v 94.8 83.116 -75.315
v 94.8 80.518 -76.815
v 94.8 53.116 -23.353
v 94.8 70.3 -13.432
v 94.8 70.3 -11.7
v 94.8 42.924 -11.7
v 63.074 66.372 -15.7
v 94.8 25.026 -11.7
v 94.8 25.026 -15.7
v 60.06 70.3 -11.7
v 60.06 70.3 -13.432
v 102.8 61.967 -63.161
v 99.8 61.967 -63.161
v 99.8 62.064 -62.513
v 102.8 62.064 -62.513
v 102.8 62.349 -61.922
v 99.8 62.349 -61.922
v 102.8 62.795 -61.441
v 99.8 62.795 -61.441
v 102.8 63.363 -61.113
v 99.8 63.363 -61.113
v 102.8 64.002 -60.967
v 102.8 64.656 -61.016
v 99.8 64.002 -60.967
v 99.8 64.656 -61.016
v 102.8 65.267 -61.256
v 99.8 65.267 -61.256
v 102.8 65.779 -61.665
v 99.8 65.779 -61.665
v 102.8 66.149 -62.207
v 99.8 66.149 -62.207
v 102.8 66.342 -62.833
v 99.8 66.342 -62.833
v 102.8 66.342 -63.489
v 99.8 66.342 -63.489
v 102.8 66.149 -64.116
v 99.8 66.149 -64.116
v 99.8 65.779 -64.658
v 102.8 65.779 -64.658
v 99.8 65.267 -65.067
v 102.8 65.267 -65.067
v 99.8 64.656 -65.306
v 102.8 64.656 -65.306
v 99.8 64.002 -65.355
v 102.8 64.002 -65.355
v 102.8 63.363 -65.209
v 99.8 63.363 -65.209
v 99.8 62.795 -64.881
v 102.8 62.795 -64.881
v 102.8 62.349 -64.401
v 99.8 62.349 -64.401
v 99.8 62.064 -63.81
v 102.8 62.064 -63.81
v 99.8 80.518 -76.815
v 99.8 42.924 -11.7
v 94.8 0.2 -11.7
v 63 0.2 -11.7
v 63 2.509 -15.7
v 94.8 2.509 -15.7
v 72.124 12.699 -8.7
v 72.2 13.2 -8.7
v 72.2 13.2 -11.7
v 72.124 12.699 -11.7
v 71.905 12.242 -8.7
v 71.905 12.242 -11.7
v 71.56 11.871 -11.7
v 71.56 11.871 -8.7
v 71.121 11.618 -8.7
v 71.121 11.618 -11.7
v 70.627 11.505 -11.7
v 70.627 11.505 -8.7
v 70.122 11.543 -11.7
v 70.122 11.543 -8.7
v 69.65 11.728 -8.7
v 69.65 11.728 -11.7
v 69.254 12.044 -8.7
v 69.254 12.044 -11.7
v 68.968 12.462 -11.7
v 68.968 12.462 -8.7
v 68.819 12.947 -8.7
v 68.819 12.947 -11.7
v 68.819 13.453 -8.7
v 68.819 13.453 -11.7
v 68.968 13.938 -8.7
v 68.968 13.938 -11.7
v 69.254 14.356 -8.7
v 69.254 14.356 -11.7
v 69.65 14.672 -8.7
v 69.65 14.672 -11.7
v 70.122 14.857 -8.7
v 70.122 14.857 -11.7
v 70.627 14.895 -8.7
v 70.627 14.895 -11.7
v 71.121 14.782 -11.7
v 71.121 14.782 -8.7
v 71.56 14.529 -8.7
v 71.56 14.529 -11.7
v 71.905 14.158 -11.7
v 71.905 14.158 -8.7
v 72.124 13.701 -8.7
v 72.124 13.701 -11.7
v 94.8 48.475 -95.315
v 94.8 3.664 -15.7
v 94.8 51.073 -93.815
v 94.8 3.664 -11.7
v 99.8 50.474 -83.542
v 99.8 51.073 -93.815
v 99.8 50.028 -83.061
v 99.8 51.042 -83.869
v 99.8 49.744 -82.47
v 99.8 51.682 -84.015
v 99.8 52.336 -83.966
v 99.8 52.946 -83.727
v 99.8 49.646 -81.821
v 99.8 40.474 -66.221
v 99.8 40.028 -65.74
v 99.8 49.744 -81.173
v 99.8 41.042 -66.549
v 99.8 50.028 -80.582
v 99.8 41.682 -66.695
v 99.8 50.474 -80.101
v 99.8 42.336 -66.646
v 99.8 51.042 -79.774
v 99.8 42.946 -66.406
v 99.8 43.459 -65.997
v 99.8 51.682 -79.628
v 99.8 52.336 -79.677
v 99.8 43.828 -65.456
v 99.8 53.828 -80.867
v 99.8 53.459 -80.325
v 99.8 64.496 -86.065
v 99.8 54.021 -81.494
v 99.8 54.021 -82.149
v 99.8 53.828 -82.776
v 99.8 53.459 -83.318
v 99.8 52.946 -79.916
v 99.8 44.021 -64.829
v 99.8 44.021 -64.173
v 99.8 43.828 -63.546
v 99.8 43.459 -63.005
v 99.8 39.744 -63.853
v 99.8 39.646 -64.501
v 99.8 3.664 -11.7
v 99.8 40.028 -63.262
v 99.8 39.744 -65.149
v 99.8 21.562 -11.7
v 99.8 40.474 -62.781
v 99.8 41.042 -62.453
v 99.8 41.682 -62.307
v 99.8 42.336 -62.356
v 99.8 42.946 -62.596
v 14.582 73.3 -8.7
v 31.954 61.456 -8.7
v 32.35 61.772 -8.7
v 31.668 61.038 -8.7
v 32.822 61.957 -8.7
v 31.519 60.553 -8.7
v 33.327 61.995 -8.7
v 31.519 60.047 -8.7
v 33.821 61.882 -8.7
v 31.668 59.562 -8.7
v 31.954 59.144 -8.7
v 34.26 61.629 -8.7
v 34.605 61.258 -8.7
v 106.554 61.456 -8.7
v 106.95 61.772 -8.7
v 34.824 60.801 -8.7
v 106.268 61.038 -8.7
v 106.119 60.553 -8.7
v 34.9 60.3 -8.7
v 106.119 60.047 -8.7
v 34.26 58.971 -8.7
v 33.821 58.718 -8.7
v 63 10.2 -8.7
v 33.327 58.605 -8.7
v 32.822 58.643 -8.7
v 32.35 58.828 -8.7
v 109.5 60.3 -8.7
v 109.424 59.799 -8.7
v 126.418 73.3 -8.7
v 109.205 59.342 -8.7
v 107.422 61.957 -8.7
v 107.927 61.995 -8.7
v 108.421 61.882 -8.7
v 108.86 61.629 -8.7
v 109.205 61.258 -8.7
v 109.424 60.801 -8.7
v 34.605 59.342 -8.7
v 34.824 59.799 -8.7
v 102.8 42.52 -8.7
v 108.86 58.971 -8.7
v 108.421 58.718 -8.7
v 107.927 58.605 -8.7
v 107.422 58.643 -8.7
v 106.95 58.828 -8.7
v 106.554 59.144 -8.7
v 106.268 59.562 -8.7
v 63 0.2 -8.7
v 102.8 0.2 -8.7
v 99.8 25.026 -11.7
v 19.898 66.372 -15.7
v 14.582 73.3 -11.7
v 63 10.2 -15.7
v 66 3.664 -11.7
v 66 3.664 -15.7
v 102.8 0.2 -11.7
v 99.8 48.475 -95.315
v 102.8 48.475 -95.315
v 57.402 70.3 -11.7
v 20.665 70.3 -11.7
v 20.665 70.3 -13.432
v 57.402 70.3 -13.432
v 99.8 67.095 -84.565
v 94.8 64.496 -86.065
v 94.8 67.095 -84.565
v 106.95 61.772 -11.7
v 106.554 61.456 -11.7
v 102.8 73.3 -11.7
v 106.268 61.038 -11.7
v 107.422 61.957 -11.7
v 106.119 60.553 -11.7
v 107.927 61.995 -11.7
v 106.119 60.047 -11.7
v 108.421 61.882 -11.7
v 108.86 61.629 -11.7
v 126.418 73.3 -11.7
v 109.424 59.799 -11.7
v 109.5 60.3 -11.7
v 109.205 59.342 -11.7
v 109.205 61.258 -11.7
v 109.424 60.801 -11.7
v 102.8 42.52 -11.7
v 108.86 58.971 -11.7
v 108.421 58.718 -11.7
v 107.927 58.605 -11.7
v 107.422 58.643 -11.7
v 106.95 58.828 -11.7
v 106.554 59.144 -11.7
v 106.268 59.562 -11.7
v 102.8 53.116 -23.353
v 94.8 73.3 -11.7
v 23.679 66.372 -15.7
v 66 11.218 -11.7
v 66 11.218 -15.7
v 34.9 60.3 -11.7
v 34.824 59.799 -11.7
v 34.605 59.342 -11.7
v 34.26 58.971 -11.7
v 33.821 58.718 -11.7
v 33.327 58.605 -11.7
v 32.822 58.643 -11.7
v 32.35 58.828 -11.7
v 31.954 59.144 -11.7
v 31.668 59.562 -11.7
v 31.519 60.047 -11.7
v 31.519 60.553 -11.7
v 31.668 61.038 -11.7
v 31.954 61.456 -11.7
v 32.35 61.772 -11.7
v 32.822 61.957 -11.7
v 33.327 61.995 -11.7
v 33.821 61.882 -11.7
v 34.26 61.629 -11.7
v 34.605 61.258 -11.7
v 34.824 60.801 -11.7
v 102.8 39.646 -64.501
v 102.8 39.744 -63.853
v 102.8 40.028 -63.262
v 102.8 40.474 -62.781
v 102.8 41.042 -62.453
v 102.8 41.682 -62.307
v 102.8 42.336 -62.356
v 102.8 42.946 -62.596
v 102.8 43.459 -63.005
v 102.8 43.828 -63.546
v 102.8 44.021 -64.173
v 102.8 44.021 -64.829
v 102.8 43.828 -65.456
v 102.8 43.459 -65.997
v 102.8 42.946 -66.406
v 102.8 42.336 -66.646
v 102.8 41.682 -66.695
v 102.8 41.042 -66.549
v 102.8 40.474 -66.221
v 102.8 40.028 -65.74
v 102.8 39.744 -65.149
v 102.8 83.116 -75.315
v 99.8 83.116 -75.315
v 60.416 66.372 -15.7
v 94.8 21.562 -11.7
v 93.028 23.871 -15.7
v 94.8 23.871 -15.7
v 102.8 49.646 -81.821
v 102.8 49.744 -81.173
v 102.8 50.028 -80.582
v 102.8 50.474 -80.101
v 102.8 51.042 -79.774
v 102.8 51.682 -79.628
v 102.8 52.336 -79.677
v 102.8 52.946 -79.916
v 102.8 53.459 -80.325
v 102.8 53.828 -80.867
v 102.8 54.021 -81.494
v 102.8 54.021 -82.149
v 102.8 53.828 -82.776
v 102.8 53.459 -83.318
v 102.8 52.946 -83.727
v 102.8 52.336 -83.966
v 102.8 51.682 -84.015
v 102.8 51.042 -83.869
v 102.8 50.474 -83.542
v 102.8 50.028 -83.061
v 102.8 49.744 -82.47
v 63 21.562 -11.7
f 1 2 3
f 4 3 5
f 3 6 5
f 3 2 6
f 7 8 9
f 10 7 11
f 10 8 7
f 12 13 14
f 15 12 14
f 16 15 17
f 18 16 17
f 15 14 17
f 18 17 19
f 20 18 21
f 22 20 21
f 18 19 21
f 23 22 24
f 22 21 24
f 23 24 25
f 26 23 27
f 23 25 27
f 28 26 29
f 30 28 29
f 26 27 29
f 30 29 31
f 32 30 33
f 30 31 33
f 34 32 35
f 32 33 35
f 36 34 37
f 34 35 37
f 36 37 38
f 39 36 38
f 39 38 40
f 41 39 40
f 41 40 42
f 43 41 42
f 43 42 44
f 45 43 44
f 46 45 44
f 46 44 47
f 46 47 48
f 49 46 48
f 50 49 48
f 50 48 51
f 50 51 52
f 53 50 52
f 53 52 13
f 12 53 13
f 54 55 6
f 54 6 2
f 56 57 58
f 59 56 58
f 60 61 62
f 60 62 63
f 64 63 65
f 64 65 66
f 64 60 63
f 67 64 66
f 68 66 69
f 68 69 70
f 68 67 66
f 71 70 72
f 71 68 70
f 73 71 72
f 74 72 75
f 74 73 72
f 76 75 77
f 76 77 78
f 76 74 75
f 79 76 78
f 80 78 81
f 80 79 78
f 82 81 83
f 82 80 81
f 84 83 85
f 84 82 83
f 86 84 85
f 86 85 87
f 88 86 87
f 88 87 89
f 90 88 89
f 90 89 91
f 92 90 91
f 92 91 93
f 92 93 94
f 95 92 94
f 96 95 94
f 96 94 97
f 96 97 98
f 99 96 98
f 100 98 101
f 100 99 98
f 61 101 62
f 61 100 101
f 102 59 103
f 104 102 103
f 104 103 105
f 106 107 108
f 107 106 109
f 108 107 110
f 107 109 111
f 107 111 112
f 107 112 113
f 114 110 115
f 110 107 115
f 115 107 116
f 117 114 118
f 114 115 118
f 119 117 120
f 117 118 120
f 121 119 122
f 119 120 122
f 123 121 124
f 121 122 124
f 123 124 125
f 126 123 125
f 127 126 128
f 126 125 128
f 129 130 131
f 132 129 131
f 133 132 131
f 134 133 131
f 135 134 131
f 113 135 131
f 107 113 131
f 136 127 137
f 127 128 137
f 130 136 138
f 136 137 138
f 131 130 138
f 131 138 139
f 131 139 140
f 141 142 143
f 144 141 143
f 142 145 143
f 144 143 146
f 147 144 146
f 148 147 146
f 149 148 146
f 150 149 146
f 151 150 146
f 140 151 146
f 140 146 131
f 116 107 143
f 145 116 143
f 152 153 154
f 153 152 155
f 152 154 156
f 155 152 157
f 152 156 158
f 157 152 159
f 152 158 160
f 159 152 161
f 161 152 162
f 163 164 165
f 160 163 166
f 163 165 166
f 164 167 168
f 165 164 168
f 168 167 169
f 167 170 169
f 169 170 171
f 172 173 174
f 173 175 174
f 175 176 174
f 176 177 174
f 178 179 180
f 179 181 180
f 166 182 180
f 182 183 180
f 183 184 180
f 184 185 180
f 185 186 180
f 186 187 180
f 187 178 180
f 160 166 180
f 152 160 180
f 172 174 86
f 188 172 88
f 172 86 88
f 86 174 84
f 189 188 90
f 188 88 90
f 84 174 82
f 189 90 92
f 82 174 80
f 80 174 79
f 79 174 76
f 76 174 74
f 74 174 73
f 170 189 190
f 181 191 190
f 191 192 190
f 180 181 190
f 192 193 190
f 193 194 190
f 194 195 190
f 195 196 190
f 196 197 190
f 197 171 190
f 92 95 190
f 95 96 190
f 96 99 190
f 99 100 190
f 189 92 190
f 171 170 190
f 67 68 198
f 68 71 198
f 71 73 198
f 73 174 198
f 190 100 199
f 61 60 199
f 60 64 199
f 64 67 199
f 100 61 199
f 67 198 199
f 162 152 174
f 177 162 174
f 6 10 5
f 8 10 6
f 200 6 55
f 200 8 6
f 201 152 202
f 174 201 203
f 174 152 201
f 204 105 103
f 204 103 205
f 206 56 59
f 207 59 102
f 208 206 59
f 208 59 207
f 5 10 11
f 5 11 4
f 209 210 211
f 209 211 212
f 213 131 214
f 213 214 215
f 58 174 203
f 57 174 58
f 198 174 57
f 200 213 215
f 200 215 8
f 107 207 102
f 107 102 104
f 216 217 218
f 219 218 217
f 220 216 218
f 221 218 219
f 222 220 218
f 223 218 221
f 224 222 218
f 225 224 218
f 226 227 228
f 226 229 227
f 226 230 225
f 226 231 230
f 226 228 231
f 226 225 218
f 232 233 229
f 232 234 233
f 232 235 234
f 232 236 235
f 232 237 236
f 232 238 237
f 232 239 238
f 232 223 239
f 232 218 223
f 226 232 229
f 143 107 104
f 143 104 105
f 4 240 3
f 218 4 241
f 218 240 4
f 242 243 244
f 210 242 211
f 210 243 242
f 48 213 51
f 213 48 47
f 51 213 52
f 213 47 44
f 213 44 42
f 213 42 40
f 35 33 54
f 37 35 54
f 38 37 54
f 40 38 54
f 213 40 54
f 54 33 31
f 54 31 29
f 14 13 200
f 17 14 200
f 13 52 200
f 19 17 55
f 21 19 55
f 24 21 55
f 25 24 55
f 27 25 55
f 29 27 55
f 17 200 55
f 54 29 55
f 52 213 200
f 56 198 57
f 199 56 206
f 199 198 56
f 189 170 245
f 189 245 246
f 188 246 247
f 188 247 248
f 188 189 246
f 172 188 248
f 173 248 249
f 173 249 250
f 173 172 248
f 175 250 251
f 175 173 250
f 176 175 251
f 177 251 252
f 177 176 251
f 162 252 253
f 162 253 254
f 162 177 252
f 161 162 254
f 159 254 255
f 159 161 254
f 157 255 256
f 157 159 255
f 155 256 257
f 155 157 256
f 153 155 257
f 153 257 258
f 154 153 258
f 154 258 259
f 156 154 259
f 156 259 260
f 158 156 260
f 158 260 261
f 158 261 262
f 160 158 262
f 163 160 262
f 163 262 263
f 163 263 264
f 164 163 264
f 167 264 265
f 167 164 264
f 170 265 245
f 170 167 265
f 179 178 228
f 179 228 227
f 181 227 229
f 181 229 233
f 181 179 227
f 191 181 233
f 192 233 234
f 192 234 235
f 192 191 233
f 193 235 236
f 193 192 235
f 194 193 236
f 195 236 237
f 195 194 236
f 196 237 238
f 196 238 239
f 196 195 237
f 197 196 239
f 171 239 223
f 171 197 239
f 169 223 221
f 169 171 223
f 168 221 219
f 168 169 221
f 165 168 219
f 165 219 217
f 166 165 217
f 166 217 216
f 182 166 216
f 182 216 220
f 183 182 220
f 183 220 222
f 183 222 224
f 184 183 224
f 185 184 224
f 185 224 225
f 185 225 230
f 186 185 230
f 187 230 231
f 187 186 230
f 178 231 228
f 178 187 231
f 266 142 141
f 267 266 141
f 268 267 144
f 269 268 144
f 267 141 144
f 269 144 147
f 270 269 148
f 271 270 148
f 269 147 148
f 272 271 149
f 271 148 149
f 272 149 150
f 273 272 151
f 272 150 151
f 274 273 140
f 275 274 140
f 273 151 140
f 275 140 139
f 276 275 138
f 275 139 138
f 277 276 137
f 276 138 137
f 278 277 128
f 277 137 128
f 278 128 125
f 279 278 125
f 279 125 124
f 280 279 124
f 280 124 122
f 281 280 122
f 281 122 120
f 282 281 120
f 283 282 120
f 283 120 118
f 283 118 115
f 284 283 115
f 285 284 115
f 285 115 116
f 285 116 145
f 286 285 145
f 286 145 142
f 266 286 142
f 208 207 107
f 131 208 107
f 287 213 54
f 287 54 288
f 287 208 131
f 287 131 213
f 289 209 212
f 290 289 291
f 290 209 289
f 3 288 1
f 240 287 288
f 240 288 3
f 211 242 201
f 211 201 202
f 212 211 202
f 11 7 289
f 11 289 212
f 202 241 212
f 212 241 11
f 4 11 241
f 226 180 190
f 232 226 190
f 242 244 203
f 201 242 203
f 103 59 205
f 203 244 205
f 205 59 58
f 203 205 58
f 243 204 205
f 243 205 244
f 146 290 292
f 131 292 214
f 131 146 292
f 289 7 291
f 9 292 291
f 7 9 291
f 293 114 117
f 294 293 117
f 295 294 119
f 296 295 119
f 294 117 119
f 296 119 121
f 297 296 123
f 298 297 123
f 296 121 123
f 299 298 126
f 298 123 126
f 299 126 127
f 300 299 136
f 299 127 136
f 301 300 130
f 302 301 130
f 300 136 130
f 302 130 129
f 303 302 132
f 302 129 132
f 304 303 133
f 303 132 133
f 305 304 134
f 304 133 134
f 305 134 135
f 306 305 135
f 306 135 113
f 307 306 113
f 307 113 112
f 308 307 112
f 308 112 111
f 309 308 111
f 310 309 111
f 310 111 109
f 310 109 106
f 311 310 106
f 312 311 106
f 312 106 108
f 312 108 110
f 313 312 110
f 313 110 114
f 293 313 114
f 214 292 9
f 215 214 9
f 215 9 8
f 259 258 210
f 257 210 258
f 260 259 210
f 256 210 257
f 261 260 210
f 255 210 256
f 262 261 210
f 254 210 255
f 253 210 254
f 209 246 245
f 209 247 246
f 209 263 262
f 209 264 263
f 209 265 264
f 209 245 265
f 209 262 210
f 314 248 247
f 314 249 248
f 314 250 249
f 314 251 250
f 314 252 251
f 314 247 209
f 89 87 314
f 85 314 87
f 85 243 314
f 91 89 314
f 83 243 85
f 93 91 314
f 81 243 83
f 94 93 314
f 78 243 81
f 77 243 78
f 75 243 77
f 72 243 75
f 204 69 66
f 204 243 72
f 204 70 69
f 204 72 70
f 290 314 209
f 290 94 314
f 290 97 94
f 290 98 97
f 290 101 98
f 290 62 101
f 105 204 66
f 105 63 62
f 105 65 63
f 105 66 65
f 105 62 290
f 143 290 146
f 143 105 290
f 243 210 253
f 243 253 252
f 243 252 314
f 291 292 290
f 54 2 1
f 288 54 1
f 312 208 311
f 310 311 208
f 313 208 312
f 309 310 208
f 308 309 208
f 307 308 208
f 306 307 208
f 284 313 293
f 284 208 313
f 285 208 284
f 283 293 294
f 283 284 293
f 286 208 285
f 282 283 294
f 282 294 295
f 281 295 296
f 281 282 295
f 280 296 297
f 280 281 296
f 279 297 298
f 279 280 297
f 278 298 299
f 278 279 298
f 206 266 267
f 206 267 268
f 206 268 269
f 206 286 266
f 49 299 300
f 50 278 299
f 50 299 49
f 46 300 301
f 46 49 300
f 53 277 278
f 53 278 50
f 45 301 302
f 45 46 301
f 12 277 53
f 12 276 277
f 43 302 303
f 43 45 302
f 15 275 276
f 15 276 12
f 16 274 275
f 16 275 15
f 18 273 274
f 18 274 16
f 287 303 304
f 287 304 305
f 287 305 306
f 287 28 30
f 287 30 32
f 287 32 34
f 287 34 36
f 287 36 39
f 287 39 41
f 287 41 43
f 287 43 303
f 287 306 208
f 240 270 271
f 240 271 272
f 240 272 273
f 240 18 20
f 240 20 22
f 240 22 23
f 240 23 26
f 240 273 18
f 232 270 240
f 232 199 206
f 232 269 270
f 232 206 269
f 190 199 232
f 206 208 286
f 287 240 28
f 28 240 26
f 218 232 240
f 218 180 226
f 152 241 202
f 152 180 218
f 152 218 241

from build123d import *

# Parameters (mm, degrees)
SKETCH040_R     = 1.7
PAD021_DEPTH    = 3
PAD022_DEPTH    = 3
SKETCH041_R     = 2.2
POCKET013_DEPTH = 26.619333
PAD020_DEPTH    = 5
PAD023_DEPTH    = 4
POCKET015_DEPTH = 31.8
POCKET014_DEPTH = 80.219333


with BuildPart() as part:
    # Sketch040 (on Face4 of Binder004) → Pad021 (new body)
    with BuildSketch(Plane(origin=(0, 0, -8.7), x_dir=(1, 0, 0), z_dir=(0, 0, -1))):
        Polygon((63, -0.2), (63, -10.2), (14.581667, -73.3), (126.418333, -73.3), (102.8, -42.519989), (102.8, -0.2), align=None)
        with Locations((70.5, -13.2)):
            Circle(SKETCH040_R, mode=Mode.SUBTRACT)
        with Locations((107.8, -60.3)):
            Circle(SKETCH040_R, mode=Mode.SUBTRACT)
        with Locations((33.2, -60.3)):
            Circle(SKETCH040_R, mode=Mode.SUBTRACT)
    extrude(amount=PAD021_DEPTH)

    # Sketch042 (on Face6 of Pad021) → Pad022 (join)
    with BuildSketch(Plane.YZ.offset(102.8)):
        Polygon((0.2, -11.7), (48.475, -95.314753), (83.116016, -75.314753), (53.116016, -23.353229), (73.3, -11.7), align=None)
    extrude(amount=-PAD022_DEPTH)

    # Sketch041 (on Face14 of Pad022) → Pocket013 (cut, through all)
    with BuildSketch(Plane(origin=(99.8, 0, 0), x_dir=(0, -1, 0), z_dir=(-1, 0, 0))):
        with Locations((-51.846002, -81.821499)):
            Circle(SKETCH041_R)
        with Locations((-41.846002, -64.500991)):
            Circle(SKETCH041_R)
        with Locations((-64.16651, -63.161245)):
            Circle(SKETCH041_R)
    extrude(amount=-POCKET013_DEPTH, mode=Mode.SUBTRACT)

    # Sketch043 (on Face14 of Pocket013) → Pad020 (join)
    with BuildSketch(Plane(origin=(99.8, 0, 0), x_dir=(0, -1, 0), z_dir=(-1, 0, 0))):
        Polygon((-0.2, -11.7), (-48.475, -95.314753), (-51.073076, -93.814753), (-3.664102, -11.7), align=None)
        Polygon((-42.92392, -11.7), (-80.51794, -76.814753), (-83.116016, -75.314753), (-53.116016, -23.353229), (-73.3, -11.7), align=None)
        Polygon((-21.56196, -11.7), (-64.49647, -86.064753), (-67.094546, -84.564753), (-25.026062, -11.7), align=None)
    extrude(amount=PAD020_DEPTH)

    # Sketch038 (on Face5 of Pad020) → Pad023 (join)
    with BuildSketch(Plane(origin=(0, 0, -11.7), x_dir=(1, 0, 0), z_dir=(0, 0, -1))):
        Polygon((94.8, -3.664102), (66, -3.664102), (66, -11.218363), (20.665065, -70.3), (57.401987, -70.3), (94.8, -21.56196), (94.8, -25.026062), (60.060085, -70.3), (94.8, -70.3), (94.8, -73.3), (14.581667, -73.3), (63, -10.2), (63, -0.2), (94.8, -0.2), align=None)
    extrude(amount=PAD023_DEPTH)

    # Sketch044 (on Face16 of Pad023) → Pocket015 (cut)
    with BuildSketch(Plane.YZ.offset(94.8)):
        Polygon((2.509401, -15.7), (0.2, -15.7), (0.2, -11.7), align=None)
        Polygon((23.871361, -15.7), (21.56196, -11.7), (21.56196, -15.7), align=None)
    extrude(amount=-POCKET015_DEPTH, mode=Mode.SUBTRACT)

    # Sketch039 (on Face30 of Pocket015) → Pocket014 (cut, through all)
    with BuildSketch(Plane.YZ.offset(94.8)):
        Polygon((73.3, -11.7), (73.3, -15.7), (66.371797, -15.7), align=None)
    extrude(amount=-POCKET014_DEPTH, mode=Mode.SUBTRACT)


solid = part.part
